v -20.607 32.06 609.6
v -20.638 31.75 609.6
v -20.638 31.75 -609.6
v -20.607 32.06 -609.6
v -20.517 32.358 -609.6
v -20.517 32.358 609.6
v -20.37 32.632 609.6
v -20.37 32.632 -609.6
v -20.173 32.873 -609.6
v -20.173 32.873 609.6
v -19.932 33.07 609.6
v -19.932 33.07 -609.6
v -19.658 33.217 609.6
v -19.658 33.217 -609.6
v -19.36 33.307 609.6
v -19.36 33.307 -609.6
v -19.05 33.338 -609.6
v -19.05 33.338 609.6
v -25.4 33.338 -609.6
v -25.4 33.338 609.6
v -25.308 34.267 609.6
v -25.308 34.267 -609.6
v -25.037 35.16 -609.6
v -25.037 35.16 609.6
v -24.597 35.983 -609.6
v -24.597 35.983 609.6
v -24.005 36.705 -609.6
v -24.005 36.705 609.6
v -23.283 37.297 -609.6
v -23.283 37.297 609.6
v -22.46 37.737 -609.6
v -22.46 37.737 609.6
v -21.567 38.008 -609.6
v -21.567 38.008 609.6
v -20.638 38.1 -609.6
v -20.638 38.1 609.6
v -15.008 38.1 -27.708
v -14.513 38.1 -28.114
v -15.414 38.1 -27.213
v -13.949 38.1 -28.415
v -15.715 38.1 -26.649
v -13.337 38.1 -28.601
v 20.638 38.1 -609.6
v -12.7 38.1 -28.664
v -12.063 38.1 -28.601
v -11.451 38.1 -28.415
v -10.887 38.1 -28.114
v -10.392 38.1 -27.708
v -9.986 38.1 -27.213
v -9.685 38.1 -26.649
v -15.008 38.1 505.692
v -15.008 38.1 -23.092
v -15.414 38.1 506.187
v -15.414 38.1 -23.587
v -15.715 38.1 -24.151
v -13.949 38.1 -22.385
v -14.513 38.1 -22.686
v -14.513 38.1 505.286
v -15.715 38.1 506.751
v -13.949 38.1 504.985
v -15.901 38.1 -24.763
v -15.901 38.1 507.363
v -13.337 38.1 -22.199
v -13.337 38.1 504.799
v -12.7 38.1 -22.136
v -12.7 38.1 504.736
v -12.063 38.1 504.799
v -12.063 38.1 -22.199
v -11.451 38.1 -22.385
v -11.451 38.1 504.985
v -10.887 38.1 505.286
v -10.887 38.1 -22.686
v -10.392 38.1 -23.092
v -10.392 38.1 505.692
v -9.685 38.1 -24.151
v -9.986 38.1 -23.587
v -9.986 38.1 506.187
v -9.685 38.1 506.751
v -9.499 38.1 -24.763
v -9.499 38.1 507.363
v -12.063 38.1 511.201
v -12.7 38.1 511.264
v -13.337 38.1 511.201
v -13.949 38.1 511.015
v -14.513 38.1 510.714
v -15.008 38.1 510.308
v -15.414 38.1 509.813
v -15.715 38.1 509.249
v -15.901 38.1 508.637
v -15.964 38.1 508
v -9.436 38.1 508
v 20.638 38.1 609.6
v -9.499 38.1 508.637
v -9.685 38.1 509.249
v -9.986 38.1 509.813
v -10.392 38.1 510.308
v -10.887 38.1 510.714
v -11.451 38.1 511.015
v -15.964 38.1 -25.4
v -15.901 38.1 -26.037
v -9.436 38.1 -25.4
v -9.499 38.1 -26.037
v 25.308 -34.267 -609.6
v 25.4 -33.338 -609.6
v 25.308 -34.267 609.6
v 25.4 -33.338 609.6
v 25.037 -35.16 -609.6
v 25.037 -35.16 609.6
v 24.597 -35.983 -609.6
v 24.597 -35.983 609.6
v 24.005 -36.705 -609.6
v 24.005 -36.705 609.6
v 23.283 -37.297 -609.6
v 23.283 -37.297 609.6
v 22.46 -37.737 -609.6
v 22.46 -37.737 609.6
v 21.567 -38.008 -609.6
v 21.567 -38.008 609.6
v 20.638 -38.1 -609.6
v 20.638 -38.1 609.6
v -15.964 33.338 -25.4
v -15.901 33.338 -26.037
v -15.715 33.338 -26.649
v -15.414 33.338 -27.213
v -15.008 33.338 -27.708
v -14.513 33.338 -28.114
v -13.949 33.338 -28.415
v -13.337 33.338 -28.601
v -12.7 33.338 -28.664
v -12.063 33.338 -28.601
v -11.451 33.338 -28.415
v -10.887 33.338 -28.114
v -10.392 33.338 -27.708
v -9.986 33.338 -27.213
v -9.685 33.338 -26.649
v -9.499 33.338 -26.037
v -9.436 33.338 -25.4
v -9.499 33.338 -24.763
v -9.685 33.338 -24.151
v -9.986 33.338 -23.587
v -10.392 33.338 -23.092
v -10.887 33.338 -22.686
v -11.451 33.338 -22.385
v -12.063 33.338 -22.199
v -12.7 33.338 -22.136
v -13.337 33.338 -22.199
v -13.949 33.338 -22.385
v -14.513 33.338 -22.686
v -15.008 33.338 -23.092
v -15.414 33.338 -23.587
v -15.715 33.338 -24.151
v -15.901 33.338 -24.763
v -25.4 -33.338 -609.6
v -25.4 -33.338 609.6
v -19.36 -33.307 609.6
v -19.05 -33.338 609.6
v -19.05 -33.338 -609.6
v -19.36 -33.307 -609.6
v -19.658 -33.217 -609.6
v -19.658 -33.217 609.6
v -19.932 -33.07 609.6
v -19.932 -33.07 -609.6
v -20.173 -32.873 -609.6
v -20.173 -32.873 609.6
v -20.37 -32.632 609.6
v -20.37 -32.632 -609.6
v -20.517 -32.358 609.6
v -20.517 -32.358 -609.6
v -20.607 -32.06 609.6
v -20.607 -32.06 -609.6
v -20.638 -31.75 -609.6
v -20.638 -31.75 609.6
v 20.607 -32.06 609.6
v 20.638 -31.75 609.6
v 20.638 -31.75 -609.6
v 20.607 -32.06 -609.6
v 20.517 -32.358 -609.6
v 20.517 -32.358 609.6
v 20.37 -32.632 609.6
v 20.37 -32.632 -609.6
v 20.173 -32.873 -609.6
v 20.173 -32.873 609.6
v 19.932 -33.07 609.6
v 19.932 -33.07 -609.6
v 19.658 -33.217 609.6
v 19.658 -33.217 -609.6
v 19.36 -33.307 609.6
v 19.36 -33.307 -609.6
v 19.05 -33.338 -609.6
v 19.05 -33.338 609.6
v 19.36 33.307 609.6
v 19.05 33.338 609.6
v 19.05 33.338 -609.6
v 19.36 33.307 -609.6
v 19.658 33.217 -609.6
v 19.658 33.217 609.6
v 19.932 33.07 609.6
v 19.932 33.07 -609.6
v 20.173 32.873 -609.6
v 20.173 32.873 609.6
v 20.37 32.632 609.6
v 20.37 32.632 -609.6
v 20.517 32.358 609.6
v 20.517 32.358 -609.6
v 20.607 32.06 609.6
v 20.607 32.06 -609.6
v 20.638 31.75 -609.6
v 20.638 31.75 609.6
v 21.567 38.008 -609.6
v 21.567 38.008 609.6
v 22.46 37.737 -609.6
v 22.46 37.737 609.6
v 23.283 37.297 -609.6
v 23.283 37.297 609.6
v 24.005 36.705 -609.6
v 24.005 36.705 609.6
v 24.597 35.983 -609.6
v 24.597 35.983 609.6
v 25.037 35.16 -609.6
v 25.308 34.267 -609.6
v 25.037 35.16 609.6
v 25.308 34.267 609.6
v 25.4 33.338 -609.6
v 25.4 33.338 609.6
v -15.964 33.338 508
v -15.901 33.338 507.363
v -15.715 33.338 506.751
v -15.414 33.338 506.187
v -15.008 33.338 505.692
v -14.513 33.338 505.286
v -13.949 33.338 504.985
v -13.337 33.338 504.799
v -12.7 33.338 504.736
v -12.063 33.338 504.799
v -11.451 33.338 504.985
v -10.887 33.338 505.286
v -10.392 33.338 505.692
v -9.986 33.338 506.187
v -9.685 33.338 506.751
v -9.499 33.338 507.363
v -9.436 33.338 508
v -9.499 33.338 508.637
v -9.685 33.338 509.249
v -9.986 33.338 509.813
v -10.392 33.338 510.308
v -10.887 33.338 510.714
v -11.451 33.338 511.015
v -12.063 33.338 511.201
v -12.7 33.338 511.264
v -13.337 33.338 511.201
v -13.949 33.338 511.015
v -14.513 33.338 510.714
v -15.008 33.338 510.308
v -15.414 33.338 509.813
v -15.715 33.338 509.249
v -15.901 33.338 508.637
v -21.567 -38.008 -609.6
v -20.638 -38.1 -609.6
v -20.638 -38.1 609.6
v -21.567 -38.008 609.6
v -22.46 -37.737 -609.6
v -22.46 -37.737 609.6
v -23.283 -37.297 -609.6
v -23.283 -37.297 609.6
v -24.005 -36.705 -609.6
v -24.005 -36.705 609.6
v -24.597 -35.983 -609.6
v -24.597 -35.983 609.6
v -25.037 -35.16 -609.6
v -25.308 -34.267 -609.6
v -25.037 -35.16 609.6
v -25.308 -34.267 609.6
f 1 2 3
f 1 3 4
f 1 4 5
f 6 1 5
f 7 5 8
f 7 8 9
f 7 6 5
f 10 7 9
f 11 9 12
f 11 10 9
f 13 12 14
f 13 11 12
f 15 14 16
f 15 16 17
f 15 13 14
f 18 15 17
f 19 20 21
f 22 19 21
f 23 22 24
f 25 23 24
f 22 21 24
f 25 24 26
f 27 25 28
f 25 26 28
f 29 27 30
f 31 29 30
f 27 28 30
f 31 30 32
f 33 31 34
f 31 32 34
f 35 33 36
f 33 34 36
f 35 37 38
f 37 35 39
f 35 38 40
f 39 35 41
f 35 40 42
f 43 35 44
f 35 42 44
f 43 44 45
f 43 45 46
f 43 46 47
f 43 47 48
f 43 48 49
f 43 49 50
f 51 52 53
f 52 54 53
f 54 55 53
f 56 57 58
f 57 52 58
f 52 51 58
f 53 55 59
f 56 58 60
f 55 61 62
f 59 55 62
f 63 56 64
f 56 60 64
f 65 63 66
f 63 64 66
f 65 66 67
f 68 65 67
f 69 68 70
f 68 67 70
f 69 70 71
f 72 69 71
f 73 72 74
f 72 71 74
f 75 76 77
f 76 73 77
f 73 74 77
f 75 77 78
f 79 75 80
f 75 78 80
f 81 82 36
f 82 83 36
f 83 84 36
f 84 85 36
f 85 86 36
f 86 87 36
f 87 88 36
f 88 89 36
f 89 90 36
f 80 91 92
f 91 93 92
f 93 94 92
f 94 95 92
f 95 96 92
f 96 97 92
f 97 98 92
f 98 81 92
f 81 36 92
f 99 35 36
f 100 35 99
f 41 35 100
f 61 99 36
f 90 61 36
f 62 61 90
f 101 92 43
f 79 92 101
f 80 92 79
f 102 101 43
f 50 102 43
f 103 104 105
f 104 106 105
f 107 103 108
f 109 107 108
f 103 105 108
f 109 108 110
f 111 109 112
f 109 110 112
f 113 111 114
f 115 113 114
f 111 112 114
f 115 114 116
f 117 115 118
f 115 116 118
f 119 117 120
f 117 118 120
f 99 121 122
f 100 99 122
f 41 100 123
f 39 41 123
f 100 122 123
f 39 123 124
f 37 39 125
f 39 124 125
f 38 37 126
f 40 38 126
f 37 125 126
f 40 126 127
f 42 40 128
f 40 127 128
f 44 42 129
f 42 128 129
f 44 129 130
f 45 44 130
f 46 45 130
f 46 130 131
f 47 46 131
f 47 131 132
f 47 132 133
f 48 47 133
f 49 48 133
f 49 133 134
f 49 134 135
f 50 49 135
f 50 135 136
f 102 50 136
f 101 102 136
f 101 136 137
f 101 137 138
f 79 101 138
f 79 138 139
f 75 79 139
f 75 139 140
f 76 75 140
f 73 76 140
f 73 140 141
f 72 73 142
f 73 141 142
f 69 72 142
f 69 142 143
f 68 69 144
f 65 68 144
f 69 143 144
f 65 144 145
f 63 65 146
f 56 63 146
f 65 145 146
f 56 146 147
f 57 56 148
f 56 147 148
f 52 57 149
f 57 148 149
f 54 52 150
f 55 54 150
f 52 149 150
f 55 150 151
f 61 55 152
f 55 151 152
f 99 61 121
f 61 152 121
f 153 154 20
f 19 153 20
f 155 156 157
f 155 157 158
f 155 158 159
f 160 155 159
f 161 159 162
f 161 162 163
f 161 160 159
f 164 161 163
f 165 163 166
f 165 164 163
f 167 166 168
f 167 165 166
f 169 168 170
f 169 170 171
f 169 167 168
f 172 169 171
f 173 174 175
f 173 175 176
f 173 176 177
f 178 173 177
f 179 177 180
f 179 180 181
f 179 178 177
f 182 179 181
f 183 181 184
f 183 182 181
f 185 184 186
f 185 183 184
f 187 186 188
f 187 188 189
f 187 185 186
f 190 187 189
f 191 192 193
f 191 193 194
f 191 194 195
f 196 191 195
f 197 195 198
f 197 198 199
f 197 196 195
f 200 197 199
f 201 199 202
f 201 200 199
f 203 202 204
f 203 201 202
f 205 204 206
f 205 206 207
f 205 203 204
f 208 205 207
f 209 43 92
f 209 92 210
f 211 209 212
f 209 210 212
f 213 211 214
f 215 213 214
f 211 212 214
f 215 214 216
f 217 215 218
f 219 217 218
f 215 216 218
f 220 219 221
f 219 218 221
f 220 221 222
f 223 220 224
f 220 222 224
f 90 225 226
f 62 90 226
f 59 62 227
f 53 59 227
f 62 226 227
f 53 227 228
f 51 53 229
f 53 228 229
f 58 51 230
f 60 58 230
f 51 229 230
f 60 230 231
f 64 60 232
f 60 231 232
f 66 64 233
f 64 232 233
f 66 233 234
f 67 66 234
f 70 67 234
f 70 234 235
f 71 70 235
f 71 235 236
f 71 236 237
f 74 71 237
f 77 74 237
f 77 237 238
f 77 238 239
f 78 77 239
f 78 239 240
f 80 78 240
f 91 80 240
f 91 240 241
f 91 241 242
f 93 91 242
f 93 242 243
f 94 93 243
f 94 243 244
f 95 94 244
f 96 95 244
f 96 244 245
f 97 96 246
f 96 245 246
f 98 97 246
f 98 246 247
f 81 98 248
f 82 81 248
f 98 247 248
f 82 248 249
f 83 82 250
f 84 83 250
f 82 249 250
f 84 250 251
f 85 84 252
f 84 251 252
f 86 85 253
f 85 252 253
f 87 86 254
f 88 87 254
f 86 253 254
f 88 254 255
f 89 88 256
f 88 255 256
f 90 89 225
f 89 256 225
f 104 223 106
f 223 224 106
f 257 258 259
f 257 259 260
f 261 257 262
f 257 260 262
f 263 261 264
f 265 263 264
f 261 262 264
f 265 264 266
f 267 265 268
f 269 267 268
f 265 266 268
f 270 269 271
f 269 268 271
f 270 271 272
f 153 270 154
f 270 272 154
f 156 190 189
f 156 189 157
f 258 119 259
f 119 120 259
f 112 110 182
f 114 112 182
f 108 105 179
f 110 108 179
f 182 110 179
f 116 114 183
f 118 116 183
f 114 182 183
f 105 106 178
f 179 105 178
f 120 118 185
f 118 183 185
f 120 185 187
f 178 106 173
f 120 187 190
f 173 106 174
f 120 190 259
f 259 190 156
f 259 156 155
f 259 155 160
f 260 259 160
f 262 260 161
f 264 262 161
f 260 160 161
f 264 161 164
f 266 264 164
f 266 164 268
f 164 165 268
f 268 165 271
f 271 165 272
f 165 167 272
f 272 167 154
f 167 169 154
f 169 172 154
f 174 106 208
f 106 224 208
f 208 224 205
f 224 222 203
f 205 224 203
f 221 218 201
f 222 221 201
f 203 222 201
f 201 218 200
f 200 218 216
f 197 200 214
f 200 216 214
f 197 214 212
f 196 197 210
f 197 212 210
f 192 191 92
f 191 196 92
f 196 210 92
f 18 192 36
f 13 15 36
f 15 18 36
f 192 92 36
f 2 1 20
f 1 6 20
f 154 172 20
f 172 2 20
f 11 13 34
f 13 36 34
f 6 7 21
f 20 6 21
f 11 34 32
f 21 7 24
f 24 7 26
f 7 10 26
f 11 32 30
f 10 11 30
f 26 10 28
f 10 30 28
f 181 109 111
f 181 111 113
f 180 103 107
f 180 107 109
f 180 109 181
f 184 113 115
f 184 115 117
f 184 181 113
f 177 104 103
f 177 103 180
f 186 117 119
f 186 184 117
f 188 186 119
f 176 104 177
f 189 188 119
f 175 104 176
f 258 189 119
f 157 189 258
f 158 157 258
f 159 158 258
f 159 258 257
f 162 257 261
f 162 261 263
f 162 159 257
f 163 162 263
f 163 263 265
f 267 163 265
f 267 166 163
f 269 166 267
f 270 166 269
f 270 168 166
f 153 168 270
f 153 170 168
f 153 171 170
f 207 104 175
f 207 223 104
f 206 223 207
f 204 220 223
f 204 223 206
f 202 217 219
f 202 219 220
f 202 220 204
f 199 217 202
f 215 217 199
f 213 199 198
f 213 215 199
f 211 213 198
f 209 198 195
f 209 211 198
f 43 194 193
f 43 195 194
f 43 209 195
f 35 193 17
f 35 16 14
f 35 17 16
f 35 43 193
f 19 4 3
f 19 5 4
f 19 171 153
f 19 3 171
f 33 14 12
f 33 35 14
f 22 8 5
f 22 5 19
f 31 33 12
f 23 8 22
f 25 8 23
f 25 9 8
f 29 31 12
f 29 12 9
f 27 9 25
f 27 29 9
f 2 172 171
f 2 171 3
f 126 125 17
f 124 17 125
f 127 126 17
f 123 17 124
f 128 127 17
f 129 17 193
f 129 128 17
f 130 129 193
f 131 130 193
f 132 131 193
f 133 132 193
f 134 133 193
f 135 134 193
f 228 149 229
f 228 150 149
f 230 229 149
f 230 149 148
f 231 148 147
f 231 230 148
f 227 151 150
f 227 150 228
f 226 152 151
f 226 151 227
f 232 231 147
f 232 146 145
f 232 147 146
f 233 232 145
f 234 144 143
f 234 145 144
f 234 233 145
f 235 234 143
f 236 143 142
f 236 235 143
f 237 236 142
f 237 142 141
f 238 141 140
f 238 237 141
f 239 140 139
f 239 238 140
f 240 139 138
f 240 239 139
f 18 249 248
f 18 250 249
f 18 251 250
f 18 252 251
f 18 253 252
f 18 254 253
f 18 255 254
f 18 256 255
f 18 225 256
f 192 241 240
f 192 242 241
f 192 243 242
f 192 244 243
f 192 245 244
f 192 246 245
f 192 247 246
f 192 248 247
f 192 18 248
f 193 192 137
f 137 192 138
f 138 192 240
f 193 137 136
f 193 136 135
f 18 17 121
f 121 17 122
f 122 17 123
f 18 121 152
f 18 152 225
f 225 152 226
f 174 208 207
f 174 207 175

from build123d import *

# Parameters (mm, degrees)
BOSS_EXTRUDE1_DEPTH          = 609.6
F_5_16_18_TAPPED_HOLE1_D     = 6.5278
F_5_16_18_TAPPED_HOLE1_DEPTH = 4.7625


with BuildPart() as part:
    # Sketch1 → Boss-Extrude1 (new body, symmetric)
    with BuildSketch(Plane.XY):
        with BuildLine():
            Line((-20.6375, 38.1), (20.6375, 38.1))
            ThreePointArc((20.6375, 38.1), (24.005096045, 36.705096045), (25.4, 33.3375))
            Line((25.4, 33.3375), (25.4, -33.3375))
            ThreePointArc((25.4, -33.3375), (24.005096045, -36.705096045), (20.6375, -38.1))
            Line((20.6375, -38.1), (-20.6375, -38.1))
            ThreePointArc((-20.6375, -38.1), (-24.005096045, -36.705096045), (-25.4, -33.3375))
            Line((-25.4, -33.3375), (-25.4, 33.3375))
            ThreePointArc((-25.4, 33.3375), (-24.005096045, 36.705096045), (-20.6375, 38.1))
        make_face()
        with BuildLine():
            Line((-19.05, 33.3375), (19.05, 33.3375))
            ThreePointArc((19.05, 33.3375), (20.172532015, 32.872532015), (20.6375, 31.75))
            Line((20.6375, 31.75), (20.6375, -31.75))
            ThreePointArc((20.6375, -31.75), (20.172532015, -32.872532015), (19.05, -33.3375))
            Line((19.05, -33.3375), (-19.05, -33.3375))
            ThreePointArc((-19.05, -33.3375), (-20.172532015, -32.872532015), (-20.6375, -31.75))
            Line((-20.6375, -31.75), (-20.6375, 31.75))
            ThreePointArc((-20.6375, 31.75), (-20.172532015, 32.872532015), (-19.05, 33.3375))
        make_face(mode=Mode.SUBTRACT)
    extrude(amount=BOSS_EXTRUDE1_DEPTH, both=True)

    # 5/16-18 Tapped Hole1
    with Locations(Plane(origin=(0, 38.1, 0), x_dir=(1, 0, 0), z_dir=(0, 1, 0))):
        with Locations((-12.7, -508), (-12.7, 25.4)):
            Hole(F_5_16_18_TAPPED_HOLE1_D / 2, depth=F_5_16_18_TAPPED_HOLE1_DEPTH)


solid = part.part
